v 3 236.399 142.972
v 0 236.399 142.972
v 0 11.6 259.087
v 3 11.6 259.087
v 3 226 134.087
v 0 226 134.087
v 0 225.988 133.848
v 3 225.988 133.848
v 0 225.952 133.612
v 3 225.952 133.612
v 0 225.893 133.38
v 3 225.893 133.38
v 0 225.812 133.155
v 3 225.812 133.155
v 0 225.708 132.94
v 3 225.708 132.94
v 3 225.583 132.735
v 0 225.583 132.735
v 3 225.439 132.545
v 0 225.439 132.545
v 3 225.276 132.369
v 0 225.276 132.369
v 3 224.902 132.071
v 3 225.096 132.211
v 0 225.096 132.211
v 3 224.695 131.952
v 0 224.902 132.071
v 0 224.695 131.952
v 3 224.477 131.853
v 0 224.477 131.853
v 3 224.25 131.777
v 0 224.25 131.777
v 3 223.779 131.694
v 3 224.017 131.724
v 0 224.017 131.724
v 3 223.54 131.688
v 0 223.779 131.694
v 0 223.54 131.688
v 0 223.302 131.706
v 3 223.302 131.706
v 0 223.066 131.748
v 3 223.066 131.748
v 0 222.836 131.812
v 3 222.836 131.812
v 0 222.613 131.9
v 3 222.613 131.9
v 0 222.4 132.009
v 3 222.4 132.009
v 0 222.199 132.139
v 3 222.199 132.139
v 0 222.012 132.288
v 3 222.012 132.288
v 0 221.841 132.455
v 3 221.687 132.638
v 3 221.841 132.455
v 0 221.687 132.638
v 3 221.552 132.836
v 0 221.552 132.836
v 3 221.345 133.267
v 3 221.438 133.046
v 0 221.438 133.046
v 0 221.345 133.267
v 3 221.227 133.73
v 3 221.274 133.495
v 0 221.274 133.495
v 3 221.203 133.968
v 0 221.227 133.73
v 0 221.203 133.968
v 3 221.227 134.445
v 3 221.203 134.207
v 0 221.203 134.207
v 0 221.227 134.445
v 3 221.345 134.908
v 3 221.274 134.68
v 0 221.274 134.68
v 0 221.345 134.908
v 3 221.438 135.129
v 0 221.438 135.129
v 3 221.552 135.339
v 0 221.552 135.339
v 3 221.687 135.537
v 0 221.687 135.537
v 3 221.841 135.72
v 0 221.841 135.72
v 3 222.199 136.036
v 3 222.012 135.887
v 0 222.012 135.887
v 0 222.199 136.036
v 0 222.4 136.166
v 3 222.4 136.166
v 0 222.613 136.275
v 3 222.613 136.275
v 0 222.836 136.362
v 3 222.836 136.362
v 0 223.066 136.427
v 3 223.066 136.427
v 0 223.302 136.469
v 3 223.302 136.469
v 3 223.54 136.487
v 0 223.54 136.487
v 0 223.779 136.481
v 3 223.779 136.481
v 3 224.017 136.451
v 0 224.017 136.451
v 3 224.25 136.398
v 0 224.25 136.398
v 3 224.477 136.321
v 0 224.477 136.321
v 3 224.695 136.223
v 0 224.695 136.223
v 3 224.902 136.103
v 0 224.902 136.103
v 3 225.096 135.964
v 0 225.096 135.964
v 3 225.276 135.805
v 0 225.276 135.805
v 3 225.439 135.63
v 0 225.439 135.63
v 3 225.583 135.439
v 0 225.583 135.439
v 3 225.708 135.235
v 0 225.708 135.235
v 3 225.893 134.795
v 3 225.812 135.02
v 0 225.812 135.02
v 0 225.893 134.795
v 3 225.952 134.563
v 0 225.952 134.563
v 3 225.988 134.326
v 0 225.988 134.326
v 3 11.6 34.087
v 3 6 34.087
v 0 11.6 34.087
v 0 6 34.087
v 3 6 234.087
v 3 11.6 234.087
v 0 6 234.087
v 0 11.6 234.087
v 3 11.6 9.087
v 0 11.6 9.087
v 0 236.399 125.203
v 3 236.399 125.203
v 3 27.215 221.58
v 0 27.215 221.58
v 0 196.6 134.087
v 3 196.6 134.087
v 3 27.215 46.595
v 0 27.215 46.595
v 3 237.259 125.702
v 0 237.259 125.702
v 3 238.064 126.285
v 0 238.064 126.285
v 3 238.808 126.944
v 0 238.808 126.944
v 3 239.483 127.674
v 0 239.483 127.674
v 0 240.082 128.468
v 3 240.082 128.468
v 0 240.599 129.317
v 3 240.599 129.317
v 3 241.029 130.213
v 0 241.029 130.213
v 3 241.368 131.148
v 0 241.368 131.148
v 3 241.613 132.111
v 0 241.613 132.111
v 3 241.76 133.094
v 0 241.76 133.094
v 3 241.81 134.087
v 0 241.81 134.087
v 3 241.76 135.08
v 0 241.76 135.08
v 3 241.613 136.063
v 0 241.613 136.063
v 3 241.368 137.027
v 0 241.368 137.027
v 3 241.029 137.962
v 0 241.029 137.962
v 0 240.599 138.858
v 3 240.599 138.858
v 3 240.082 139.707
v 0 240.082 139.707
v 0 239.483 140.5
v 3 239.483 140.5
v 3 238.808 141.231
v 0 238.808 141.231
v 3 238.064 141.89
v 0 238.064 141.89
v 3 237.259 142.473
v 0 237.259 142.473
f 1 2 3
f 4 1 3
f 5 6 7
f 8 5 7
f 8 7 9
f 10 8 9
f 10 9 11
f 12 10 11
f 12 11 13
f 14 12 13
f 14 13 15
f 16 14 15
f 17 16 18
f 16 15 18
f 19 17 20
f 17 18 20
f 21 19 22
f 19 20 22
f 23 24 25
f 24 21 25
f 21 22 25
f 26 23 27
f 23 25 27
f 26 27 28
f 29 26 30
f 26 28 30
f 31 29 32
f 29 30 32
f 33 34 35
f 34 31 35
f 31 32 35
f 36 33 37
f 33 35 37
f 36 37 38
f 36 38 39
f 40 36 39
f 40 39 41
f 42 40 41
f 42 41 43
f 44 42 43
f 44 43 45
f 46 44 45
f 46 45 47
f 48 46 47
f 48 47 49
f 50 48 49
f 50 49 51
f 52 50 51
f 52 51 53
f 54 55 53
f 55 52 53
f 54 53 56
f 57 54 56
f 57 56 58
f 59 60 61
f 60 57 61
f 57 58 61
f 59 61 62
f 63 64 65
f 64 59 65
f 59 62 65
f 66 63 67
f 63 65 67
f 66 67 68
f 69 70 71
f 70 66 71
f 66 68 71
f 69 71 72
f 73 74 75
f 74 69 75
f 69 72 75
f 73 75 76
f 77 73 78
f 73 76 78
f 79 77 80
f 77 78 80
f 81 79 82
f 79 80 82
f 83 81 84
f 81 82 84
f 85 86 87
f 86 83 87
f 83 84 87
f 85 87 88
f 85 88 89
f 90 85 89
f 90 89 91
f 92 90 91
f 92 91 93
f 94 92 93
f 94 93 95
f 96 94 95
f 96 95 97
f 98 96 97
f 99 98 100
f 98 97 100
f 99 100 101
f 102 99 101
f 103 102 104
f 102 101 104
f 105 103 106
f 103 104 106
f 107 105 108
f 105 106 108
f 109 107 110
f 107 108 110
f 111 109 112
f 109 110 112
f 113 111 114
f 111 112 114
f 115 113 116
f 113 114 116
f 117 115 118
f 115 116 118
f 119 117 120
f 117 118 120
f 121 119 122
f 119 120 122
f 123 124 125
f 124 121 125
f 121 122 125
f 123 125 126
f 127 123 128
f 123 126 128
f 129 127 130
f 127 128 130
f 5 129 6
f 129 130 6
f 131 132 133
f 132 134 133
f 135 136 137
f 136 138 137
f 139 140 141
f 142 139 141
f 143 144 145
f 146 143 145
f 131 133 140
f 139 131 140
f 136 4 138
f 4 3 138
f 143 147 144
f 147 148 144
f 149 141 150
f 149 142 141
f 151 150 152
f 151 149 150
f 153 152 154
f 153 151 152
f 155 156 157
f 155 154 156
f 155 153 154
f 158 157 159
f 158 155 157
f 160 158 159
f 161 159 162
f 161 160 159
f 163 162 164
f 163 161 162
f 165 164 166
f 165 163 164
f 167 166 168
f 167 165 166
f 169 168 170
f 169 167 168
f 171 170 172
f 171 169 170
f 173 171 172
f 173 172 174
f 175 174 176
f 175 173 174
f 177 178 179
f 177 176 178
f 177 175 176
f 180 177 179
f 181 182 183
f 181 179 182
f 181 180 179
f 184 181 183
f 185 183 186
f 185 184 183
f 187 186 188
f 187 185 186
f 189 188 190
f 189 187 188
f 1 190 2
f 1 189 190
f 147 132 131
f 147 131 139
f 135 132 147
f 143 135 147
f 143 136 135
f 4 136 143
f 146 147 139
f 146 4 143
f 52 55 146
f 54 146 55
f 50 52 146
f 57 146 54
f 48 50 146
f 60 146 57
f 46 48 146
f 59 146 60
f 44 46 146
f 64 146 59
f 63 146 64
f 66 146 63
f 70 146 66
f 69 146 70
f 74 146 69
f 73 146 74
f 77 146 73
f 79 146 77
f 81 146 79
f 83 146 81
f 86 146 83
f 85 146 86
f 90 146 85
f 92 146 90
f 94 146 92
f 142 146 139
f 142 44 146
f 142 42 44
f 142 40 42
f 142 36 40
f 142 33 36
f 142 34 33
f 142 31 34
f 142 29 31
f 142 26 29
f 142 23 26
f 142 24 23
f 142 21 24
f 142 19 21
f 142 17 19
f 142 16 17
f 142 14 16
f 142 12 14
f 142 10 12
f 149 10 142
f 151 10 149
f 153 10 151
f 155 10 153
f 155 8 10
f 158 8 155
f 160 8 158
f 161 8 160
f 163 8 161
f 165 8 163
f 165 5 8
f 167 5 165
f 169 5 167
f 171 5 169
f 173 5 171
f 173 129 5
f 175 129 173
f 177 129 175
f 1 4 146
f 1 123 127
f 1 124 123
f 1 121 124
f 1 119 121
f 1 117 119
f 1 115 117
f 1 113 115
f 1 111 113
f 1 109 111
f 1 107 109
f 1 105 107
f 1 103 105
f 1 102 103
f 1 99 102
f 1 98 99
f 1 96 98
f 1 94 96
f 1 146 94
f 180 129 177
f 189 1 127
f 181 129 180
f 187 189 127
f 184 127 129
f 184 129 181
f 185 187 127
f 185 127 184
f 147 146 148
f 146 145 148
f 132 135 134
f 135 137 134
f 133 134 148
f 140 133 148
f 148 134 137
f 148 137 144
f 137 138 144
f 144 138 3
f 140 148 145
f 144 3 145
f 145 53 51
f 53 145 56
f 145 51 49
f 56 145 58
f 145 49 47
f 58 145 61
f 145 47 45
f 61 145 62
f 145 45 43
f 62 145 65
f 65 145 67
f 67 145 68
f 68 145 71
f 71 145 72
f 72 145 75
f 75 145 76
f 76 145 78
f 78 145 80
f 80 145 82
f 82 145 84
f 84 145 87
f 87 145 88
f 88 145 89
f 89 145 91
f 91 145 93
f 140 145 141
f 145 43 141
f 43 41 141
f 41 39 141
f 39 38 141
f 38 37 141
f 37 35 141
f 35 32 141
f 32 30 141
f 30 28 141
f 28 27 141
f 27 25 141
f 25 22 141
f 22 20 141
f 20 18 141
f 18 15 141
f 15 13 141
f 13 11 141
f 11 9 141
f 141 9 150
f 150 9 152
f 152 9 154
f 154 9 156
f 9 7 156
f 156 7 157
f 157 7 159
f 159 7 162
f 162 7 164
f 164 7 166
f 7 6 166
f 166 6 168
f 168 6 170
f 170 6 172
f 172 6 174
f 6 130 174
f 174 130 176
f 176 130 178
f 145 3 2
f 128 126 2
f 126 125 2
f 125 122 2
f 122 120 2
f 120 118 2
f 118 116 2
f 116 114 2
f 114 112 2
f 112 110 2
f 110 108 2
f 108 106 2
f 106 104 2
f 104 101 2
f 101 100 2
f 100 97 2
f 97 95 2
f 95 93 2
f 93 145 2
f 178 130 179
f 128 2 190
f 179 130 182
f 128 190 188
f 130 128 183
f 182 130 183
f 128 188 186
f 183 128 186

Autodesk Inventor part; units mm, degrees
ref_plane "YZ Plane" through (0, 0, 0) normal (1, 0, 0) x (0, 1, 0)
ref_plane "XZ Plane" through (0, 0, 0) normal (0, 1, 0) x (-1, 0, 0)
ref_plane "XY Plane" through (0, 0, 0) normal (0, 0, 1) x (1, 0, 0)
sketch "Sketch1" plane through (0, 0, 0) normal (1, 0, 0) x (0, 1, 0)
  line L0 (11.6, 259.0874) -> (11.6, 234.0874)
  line L1 (11.6, 234.0874) -> (6, 234.0874)
  line L2 (6, 234.0874) -> (6, 34.0874)
  line L3 (6, 34.0874) -> (11.6, 34.0874)
  line L4 (11.6, 34.0874) -> (11.6, 9.0874)
  line L5 (11.6, 9.0874) -> (253.6, 134.0874)
  line L6 (253.6, 134.0874) -> (11.6, 259.0874)
  circle A0 centre (223.6, 134.0874) radius 2.4
  line L7 (253.6, 134.0874) -> (6, 134.0874) construction
  point P0 (0, 0)
  dimension "d0" = 4.8
  dimension "d1" = 5.6
  dimension "d2" = 200
  dimension "d4" = 30
  dimension "d5" = 250
  dimension "d8" = 242
  dimension "d9" = 212
extrude "Extrusion1" add sketch "Sketch1" along normal blind 3
fillet "Fillet1" radius 10 1 edges at (1.5, 253.6, 134.0874)
sketch "Sketch2" plane through (0, 0, 0) normal (-1, 0, 0) x (0, 0, 1)
  line L0 (46.5951, 27.2148) -> (221.5798, 27.2148)
  line L1 (221.5798, 27.2148) -> (134.0874, 196.6)
  line L2 (134.0874, 196.6) -> (46.5951, 27.2148)
  line L3 (234.0874, 6) -> (34.0874, 6) projected
  circle A0 centre (134.0874, 223.6) radius 2.4 projected
  line L4 (134.0874, 223.6) -> (134.0874, 6) construction
  line L5 (234.0874, 6) -> (34.0874, 6) projected
  line L6 (9.0874, 11.6) -> (125.2027, 236.3991) projected
  point P0 (0, 0)
extrude "Extrusion2" cut sketch "Sketch2" against normal blind 10 contours L2 L1 L0
equation "\"d2\" = SlotLength"
equation "\"d4\" = HingeDistance"
equation "\"d5\" = StandWidth"
equation "\"d13\" = Width"
equation "\"ScrewDiameter\" = 3"
equation "\"Width\" = 10"
equation "\"SlotLength\" = 200"
equation "\"HingeDistance\" = 30"
equation "\"StandWidth\" = 250"
properties part number "Stand" material "ABS Plastic"
